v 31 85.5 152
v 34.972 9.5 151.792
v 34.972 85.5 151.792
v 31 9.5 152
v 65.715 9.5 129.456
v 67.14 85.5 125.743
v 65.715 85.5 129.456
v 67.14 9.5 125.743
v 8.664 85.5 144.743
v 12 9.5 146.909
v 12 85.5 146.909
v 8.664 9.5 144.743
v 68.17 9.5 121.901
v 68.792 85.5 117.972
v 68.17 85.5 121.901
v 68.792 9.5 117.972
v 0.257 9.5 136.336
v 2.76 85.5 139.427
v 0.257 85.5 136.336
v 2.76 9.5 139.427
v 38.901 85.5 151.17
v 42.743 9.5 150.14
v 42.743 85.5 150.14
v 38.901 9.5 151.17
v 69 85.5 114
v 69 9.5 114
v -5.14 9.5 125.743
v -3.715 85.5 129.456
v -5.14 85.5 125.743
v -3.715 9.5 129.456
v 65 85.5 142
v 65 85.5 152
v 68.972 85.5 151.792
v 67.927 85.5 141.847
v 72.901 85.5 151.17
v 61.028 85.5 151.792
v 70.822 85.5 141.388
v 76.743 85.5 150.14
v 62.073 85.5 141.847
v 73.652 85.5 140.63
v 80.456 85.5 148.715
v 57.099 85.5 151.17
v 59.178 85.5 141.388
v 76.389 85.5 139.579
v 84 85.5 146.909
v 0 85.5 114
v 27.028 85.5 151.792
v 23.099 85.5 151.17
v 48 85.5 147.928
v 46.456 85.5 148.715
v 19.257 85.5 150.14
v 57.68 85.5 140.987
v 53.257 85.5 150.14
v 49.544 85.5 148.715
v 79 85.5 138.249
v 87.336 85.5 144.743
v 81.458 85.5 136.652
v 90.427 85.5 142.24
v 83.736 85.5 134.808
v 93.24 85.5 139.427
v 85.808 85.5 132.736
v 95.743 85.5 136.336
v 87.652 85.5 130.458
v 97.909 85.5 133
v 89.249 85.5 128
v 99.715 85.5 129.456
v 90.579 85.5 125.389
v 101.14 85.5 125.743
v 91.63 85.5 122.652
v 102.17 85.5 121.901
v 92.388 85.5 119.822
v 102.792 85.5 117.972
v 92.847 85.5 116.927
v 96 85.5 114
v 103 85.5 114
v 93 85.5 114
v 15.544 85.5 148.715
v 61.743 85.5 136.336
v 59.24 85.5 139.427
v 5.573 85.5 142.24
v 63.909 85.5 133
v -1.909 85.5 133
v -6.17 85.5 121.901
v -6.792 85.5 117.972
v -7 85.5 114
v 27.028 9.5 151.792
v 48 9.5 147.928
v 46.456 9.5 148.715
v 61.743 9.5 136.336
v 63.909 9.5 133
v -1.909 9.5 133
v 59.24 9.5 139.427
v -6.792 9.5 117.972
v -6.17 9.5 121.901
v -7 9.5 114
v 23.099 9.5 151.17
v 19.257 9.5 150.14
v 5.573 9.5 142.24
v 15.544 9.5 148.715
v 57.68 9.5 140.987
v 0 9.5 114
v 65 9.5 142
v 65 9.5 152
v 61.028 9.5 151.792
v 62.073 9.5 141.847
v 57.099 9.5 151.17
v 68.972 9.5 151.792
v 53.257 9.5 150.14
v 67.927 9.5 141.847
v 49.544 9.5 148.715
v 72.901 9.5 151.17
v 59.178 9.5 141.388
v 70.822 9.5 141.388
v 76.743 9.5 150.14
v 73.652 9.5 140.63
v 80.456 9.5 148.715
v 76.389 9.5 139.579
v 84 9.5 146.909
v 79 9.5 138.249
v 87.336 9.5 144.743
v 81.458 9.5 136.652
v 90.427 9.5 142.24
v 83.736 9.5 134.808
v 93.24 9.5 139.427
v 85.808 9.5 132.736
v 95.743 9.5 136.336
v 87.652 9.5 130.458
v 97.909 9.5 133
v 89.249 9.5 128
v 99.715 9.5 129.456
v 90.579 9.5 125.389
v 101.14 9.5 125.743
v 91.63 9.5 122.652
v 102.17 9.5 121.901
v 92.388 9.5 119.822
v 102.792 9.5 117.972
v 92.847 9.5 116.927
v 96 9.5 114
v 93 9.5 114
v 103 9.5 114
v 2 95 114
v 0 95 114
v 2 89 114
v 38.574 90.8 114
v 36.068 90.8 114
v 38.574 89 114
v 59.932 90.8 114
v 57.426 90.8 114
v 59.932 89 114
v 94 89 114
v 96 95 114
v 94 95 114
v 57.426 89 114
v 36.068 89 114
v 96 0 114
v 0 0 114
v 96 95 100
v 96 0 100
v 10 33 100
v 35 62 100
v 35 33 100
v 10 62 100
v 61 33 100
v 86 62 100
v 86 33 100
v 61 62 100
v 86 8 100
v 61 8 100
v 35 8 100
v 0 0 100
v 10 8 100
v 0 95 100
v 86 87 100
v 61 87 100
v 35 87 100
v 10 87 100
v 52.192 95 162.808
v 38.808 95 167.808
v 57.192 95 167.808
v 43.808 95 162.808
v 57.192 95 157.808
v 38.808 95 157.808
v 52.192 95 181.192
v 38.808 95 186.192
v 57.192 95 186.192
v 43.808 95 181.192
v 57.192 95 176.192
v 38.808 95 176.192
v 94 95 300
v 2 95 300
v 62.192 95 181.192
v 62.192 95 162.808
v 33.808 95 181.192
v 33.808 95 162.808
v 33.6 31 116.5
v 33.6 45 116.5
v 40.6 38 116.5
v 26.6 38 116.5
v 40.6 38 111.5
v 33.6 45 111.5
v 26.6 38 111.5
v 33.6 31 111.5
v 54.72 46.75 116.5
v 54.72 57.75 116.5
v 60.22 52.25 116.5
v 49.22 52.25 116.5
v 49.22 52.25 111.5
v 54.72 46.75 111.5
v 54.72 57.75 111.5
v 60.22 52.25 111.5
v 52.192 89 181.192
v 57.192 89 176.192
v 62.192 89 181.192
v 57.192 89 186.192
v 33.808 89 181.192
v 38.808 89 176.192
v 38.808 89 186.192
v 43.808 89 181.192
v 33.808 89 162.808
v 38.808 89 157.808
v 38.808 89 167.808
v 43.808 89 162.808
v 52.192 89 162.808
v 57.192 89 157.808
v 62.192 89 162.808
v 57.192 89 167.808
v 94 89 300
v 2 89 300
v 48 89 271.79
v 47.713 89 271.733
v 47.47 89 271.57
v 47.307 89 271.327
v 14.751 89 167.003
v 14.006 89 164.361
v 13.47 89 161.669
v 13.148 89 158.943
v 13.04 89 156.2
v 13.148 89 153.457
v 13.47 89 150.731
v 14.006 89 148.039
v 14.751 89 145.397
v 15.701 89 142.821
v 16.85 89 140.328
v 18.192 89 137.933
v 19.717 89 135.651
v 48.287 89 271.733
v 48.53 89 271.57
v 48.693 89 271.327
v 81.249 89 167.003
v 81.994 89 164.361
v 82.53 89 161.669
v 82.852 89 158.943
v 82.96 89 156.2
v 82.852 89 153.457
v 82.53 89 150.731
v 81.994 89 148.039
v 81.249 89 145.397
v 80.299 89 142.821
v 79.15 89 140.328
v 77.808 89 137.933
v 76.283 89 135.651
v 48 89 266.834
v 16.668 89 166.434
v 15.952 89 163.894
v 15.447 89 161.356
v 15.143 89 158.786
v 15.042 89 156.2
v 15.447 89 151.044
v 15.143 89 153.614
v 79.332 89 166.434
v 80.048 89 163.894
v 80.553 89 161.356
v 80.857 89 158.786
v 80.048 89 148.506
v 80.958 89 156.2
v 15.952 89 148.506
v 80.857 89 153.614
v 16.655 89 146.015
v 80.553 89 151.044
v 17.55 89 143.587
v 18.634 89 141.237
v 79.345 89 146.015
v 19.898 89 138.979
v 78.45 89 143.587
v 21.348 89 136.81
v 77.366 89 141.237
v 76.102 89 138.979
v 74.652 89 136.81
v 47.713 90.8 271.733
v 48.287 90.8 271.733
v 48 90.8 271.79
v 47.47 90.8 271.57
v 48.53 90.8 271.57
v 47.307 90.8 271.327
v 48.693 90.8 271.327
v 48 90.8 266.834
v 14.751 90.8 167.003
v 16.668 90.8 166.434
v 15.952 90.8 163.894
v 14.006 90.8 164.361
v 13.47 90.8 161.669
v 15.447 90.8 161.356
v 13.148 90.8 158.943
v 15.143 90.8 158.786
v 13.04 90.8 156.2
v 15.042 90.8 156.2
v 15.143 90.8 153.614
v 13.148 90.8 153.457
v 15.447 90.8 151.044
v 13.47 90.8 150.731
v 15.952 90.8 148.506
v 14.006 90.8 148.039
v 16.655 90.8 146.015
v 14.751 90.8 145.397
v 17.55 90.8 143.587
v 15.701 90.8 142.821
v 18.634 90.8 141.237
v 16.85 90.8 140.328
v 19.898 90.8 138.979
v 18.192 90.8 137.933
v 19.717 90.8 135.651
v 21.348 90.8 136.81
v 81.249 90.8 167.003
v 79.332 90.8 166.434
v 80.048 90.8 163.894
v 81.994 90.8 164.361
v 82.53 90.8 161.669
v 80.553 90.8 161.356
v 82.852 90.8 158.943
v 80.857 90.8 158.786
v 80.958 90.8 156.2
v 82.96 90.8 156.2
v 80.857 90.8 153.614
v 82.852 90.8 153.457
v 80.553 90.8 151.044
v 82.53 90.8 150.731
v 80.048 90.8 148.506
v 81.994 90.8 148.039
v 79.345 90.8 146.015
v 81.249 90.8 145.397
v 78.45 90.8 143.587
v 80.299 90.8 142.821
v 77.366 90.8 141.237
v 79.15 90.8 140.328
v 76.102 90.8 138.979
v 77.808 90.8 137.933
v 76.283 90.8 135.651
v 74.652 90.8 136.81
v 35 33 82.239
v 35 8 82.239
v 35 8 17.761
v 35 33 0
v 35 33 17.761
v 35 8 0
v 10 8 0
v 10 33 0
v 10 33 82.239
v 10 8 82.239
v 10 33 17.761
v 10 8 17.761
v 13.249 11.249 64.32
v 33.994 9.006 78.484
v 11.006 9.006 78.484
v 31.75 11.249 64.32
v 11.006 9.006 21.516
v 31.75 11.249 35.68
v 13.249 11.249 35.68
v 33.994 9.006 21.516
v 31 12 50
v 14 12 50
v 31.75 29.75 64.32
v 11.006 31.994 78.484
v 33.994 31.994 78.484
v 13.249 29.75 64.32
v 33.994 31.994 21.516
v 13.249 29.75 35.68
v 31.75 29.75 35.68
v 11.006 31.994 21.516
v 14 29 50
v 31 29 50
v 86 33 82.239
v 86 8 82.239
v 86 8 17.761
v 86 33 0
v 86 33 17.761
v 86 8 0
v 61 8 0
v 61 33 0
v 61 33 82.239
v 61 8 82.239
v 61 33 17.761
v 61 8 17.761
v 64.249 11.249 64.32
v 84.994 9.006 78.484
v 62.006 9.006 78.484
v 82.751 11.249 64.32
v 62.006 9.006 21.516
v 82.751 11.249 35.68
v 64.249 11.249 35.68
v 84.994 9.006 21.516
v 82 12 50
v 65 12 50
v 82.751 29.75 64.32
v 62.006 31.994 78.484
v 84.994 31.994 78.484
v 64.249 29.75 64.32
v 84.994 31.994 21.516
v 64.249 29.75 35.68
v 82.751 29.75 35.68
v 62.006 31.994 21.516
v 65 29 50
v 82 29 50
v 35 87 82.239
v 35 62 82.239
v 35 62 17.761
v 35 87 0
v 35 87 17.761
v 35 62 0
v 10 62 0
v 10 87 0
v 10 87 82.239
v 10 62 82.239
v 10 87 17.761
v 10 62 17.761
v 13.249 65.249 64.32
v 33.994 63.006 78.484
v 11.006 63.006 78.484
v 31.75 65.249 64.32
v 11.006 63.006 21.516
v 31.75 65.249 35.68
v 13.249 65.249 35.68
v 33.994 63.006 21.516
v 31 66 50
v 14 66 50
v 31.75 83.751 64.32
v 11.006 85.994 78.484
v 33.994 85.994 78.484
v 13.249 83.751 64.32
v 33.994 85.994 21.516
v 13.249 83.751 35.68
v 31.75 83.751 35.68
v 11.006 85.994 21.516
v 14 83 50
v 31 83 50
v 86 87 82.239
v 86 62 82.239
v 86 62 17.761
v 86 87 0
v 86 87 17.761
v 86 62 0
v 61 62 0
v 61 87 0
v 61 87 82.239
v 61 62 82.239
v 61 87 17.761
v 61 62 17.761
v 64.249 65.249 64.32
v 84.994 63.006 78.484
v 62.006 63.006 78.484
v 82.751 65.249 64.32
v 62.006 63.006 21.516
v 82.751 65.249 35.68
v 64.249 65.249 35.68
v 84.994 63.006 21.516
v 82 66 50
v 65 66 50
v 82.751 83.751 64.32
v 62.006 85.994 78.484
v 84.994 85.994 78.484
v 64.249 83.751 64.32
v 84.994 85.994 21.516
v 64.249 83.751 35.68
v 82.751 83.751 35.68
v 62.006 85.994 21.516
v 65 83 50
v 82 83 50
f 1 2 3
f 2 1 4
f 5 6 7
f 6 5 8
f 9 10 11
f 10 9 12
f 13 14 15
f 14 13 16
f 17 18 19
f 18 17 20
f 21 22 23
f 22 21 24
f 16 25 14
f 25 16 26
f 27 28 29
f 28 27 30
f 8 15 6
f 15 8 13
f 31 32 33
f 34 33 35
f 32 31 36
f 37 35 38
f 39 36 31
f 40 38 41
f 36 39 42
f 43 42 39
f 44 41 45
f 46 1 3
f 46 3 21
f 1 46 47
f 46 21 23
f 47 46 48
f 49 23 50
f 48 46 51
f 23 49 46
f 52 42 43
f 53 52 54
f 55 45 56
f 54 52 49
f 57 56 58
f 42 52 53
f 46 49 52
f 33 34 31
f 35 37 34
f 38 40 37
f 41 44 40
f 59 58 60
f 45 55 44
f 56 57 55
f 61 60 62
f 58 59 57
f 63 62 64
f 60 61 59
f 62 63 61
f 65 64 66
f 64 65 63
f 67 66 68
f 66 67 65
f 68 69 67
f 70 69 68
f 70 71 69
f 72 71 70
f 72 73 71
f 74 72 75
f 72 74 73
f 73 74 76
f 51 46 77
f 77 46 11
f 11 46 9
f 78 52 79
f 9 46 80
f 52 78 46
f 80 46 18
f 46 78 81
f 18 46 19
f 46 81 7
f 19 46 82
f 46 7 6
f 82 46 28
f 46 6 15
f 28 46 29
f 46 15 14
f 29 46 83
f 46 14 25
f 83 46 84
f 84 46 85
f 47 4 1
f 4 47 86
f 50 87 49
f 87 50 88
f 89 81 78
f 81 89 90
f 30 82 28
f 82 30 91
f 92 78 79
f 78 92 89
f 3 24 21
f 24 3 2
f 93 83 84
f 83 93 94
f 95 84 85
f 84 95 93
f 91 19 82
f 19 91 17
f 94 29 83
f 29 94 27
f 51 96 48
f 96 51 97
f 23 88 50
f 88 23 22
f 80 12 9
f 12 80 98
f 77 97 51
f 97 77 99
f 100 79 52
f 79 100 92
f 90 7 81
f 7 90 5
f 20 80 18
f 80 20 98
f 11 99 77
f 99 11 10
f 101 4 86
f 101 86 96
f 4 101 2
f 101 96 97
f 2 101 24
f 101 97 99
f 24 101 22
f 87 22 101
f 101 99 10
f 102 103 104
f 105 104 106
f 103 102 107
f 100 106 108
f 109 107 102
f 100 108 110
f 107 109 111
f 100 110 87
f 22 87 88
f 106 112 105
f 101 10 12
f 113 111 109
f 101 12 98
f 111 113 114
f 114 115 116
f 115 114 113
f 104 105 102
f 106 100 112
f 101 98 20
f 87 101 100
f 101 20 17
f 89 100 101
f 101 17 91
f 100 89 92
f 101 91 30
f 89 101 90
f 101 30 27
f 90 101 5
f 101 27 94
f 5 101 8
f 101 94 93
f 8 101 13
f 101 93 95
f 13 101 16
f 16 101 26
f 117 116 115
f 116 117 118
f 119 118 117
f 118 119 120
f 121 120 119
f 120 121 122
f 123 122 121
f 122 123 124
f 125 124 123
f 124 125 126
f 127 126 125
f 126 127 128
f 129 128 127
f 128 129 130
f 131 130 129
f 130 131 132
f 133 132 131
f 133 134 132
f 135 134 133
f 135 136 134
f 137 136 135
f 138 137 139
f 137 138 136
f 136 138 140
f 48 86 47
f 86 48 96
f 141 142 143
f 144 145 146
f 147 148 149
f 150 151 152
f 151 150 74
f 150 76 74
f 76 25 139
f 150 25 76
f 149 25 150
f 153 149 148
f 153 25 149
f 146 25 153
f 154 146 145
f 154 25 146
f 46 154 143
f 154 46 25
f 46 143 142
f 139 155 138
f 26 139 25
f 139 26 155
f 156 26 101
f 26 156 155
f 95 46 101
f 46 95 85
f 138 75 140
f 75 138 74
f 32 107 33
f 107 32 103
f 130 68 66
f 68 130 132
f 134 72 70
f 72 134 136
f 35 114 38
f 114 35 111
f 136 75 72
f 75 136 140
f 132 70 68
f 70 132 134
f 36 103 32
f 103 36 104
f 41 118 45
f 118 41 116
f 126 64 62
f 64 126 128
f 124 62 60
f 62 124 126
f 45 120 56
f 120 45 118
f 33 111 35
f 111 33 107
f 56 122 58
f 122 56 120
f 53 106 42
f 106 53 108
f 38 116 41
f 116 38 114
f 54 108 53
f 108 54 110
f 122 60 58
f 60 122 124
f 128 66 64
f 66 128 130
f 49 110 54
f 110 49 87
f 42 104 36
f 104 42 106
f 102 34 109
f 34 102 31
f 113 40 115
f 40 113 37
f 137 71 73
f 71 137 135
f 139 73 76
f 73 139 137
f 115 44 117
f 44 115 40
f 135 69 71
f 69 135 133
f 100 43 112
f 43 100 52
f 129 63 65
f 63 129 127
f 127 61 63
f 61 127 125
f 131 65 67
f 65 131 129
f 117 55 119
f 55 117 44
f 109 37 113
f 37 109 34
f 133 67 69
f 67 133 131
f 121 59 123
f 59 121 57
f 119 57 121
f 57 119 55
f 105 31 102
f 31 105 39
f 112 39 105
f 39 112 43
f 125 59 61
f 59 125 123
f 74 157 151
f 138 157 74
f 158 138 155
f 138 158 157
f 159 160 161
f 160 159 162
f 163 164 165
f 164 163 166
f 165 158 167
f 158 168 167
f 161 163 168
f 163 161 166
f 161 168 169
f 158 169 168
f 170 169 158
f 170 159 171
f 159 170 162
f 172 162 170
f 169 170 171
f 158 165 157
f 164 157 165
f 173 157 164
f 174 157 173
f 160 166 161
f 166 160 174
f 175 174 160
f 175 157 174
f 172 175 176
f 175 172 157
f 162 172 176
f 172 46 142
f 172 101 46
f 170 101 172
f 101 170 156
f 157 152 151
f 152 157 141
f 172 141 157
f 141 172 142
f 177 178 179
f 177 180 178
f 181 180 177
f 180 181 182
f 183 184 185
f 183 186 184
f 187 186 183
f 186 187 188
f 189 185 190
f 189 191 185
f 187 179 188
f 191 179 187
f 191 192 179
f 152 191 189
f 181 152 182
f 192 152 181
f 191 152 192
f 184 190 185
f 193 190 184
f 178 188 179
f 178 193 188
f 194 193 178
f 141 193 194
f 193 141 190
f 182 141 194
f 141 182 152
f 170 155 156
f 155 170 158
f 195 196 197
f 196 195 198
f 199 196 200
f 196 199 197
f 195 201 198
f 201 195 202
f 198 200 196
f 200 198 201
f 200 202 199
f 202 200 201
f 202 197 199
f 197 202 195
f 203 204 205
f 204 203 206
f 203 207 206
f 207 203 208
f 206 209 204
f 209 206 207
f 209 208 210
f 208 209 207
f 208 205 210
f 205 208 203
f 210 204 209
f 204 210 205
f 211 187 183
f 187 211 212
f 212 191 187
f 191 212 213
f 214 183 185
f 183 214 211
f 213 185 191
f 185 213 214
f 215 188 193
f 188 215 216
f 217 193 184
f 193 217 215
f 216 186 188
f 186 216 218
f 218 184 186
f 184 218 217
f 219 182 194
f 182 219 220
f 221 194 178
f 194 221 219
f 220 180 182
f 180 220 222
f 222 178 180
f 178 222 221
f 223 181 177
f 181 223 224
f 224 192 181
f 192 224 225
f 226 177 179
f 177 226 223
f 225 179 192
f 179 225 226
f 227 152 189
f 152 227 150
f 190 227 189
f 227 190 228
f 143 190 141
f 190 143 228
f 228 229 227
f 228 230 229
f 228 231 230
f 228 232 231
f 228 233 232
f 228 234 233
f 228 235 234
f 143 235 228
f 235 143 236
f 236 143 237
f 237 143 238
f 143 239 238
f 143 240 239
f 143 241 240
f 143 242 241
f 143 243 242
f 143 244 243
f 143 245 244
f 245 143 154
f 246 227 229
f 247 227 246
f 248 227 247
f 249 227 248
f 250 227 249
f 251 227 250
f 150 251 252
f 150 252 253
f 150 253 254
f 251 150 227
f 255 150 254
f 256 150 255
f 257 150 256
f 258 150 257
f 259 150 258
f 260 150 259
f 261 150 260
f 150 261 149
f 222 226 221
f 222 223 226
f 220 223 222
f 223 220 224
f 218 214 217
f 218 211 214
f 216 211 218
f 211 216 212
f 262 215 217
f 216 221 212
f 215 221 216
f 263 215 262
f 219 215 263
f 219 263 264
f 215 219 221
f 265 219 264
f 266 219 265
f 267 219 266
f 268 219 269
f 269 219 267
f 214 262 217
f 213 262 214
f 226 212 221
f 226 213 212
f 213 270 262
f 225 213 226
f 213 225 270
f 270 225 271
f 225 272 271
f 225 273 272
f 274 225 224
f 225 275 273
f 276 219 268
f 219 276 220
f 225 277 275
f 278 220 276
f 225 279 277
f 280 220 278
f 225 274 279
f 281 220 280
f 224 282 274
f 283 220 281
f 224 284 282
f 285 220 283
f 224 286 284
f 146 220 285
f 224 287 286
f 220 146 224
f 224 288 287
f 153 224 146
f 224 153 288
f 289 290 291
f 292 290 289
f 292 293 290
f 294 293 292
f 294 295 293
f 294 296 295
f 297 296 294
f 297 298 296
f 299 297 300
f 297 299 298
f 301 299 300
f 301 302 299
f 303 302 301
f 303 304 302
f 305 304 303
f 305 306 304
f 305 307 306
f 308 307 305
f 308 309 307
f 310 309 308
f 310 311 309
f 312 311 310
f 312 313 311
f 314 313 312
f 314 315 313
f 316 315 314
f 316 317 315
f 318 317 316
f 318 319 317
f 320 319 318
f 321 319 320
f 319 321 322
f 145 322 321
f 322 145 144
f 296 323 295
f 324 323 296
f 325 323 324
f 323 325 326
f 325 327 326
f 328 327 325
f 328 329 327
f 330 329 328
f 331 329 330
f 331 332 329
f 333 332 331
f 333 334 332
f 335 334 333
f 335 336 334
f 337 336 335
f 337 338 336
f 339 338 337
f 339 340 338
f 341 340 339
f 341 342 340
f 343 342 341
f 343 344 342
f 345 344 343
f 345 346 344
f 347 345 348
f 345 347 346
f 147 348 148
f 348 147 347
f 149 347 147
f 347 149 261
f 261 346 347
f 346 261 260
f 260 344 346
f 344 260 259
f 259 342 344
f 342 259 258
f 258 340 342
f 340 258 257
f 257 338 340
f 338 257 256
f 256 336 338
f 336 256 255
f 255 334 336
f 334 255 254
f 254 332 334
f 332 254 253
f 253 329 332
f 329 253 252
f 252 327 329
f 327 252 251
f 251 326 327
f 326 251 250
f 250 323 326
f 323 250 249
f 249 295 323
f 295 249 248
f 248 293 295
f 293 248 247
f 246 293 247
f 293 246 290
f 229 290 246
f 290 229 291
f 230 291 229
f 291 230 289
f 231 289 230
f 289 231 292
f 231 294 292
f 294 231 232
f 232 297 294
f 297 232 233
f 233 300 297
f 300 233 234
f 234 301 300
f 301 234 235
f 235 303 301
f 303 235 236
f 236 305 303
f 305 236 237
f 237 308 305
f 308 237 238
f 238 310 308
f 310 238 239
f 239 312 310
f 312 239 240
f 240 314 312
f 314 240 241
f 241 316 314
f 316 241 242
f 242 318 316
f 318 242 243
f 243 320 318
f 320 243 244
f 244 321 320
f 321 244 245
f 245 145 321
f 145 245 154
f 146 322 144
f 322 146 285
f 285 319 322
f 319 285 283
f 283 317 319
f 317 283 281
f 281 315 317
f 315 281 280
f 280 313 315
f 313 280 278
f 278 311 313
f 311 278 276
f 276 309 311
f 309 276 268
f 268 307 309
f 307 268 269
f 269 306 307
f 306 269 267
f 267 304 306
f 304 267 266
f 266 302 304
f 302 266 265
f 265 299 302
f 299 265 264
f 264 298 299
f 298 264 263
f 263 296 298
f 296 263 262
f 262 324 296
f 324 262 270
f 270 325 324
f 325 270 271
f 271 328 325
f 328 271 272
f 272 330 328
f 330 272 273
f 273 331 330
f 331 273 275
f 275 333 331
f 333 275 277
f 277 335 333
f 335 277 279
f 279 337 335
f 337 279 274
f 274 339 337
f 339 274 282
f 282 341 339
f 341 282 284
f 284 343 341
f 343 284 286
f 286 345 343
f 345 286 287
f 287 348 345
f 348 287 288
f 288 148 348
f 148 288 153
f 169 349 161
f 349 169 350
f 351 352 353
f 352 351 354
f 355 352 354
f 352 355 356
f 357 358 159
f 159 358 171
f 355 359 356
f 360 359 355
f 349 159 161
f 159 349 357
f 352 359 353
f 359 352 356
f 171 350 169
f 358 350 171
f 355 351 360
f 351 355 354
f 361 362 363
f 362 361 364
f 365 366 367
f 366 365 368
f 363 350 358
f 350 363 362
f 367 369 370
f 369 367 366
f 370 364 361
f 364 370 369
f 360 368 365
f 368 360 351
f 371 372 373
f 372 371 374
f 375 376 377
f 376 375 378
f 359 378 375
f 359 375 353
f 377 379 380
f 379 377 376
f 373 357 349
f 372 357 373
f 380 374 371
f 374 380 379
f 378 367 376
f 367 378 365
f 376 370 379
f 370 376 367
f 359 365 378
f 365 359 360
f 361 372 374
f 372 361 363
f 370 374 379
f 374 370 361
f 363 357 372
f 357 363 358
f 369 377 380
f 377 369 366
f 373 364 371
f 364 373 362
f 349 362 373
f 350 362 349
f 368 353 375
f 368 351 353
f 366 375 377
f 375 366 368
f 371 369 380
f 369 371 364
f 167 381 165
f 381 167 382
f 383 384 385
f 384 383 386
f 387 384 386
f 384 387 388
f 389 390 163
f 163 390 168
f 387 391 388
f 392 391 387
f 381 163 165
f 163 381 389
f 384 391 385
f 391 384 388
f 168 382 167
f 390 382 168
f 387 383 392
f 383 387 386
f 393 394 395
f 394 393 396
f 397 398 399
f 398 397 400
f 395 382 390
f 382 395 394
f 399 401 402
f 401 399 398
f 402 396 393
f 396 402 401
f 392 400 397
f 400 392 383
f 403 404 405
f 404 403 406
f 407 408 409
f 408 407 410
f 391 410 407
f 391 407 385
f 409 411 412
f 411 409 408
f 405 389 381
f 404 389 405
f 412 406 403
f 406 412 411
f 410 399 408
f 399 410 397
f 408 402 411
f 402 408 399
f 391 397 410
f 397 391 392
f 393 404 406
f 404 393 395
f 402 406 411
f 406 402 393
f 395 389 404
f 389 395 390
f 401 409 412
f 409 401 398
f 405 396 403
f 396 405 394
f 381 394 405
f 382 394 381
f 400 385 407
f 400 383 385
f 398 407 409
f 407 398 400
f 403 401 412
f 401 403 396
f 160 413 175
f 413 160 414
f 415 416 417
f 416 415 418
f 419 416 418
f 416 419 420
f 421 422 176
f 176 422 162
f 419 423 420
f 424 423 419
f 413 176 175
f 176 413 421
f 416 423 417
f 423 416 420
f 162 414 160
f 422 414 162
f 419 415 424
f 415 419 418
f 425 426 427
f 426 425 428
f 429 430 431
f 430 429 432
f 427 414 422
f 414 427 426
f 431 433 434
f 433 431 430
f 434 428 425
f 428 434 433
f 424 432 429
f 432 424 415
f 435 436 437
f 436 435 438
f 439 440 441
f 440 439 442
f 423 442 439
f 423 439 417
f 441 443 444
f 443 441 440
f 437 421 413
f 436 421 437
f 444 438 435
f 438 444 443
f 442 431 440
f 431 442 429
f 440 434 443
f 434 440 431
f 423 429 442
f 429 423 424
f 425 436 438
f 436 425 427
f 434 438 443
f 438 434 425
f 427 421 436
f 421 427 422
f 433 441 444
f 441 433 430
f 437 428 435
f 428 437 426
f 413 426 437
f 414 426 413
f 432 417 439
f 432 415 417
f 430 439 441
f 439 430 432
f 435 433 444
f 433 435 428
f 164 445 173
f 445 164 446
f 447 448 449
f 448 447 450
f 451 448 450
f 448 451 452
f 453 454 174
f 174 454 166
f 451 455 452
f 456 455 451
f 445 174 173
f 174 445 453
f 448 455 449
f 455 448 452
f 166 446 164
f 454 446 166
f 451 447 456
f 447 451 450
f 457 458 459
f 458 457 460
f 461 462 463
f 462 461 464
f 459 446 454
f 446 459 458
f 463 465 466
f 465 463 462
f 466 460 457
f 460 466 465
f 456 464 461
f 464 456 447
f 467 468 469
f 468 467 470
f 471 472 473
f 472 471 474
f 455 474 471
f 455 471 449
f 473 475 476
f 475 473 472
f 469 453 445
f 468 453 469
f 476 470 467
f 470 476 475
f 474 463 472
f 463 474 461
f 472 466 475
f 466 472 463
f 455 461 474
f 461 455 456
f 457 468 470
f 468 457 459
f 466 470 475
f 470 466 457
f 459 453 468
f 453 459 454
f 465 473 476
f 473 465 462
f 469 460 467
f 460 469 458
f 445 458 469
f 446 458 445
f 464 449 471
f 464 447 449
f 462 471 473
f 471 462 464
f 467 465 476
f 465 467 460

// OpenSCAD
// Stylized Gothic Throne Chair Assembly
// Decorative bracket (seat + backrest) with 4 waisted column legs
$fn = 60;

// ===== Parameters =====
// Leg dimensions
leg_sz    = 25;       // Cross-section size
leg_h     = 100;      // Height
waist_r   = 137;      // Concave cylinder radius for waisted profile
waist_d   = 4;        // Max concavity depth at mid-height

// Seat platform
seat_w    = 96;       // Width (X)
seat_d    = 95;       // Depth (Y)
seat_t    = 14;       // Thickness (Z)
seat_z    = leg_h;    // Bottom Z position

// Backrest panel
back_w    = 92;       // Width
back_h    = 200;      // Height from seat bottom
back_t    = 6;        // Thickness

// Side arc decorations
arc_r     = 38;       // Semicircle radius (~R50 scaled for fit)
arc_wall  = 10;       // Arch wall thickness (right side)
arc_oh    = 7;        // Overhang past seat edge

// Leg layout
leg_ix    = 10;       // Inset from seat edge X
leg_iy    = 8;        // Inset from seat edge Y

// ===== Waisted Column =====
// Square column with concave cylindrical faces creating hourglass profile
module waisted_column() {
    o = waist_r - waist_d;
    difference() {
        cube([leg_sz, leg_sz, leg_h]);
        // Horizontal cylinders centered at mid-height carve each face
        translate([-1, -o, leg_h/2])
            rotate([0,90,0]) cylinder(h=leg_sz+2, r=waist_r);
        translate([-1, leg_sz+o, leg_h/2])
            rotate([0,90,0]) cylinder(h=leg_sz+2, r=waist_r);
        translate([-o, -1, leg_h/2])
            rotate([-90,0,0]) cylinder(h=leg_sz+2, r=waist_r);
        translate([leg_sz+o, -1, leg_h/2])
            rotate([-90,0,0]) cylinder(h=leg_sz+2, r=waist_r);
    }
}

// ===== Diamond Prism (for cutouts/engravings) =====
module diamond(sz, dp) {
    rotate([0,0,45])
        cube([sz/sqrt(2), sz/sqrt(2), dp], center=true);
}

// ===== 2D Leaf/Teardrop Profile =====
// Pointed at top, widest at ~30% height
module leaf_2d(w, h) {
    hull() {
        translate([0, h*0.30]) circle(d=w, $fn=80);
        translate([0, h*0.96]) circle(d=1.5, $fn=16);
        circle(d=w*0.1, $fn=20);
    }
}

// ===== Leaf Groove =====
// 3D outline of leaf shape for engraving on front face
// Oriented: +Y = into face, +Z = upward
module leaf_groove(w, h, line_w, depth) {
    rotate([90, 0, 0])
        translate([0, 0, -depth])
            linear_extrude(height = depth + 0.01)
                difference() {
                    leaf_2d(w, h);
                    offset(delta = -line_w)
                        leaf_2d(w, h);
                }
}

// ===== Half Dome =====
// Flat base at z=0, dome to z=r, extends along +Y for len
module half_dome(r, len) {
    intersection() {
        rotate([-90,0,0]) cylinder(h=len, r=r, $fn=60);
        translate([-r, 0, 0]) cube([2*r, len, r]);
    }
}

// ===== Backrest Panel =====
// Tall panel with engraved leaf contour and diamond through-cutouts
module backrest() {
    lw = back_w * 0.76;
    lh = back_h * 0.87;
    cx = back_w / 2;
    cz = back_h * 0.36;

    difference() {
        cube([back_w, back_t, back_h]);

        // Engraved leaf outline on front face (y=0)
        translate([cx, 0, back_h * 0.02])
            leaf_groove(lw, lh, 2, 1.8);

        // Diamond through-cutouts in cross pattern
        for (a = [45, 135, 225, 315])
            translate([cx + 13*cos(a), back_t/2, cz + 13*sin(a)])
                rotate([90,0,0])
                    diamond(10, back_t + 4);
    }
}

// ===== Seat Platform with Side Arcs =====
// Rectangular seat with semicircular dome (left) and arch (right)
module seat_with_arcs() {
    ay = (seat_d - 2*arc_r) / 2;  // Y offset to center arcs on seat

    difference() {
        union() {
            // Main rectangular platform
            cube([seat_w, seat_d, seat_t]);

            // Left side: solid semicylinder dome
            translate([arc_r - arc_oh, ay, seat_t])
                half_dome(arc_r, 2*arc_r);

            // Right side: hollow arch (semicylinder shell)
            translate([seat_w - arc_r + arc_oh, ay, seat_t])
                difference() {
                    half_dome(arc_r, 2*arc_r);
                    translate([0, -1, 0])
                        half_dome(arc_r - arc_wall, 2*arc_r + 2);
                }
        }

        // Diamond engravings on seat top surface
        translate([seat_w*0.35, seat_d*0.40, seat_t])
            diamond(14, 5);
        translate([seat_w*0.57, seat_d*0.55, seat_t])
            diamond(11, 5);
    }
}

// ===== Main Assembly =====
union() {
    // Decorative bracket: seat + backrest
    translate([0, 0, seat_z]) {
        seat_with_arcs();

        // Backrest centered at rear of seat
        translate([(seat_w - back_w)/2, seat_d - back_t, 0])
            backrest();
    }

    // Four waisted column legs at seat corners
    // Front-left
    translate([leg_ix, leg_iy, 0])
        waisted_column();
    // Front-right
    translate([seat_w - leg_ix - leg_sz, leg_iy, 0])
        waisted_column();
    // Back-left
    translate([leg_ix, seat_d - leg_iy - leg_sz, 0])
        waisted_column();
    // Back-right
    translate([seat_w - leg_ix - leg_sz, seat_d - leg_iy - leg_sz, 0])
        waisted_column();
}
